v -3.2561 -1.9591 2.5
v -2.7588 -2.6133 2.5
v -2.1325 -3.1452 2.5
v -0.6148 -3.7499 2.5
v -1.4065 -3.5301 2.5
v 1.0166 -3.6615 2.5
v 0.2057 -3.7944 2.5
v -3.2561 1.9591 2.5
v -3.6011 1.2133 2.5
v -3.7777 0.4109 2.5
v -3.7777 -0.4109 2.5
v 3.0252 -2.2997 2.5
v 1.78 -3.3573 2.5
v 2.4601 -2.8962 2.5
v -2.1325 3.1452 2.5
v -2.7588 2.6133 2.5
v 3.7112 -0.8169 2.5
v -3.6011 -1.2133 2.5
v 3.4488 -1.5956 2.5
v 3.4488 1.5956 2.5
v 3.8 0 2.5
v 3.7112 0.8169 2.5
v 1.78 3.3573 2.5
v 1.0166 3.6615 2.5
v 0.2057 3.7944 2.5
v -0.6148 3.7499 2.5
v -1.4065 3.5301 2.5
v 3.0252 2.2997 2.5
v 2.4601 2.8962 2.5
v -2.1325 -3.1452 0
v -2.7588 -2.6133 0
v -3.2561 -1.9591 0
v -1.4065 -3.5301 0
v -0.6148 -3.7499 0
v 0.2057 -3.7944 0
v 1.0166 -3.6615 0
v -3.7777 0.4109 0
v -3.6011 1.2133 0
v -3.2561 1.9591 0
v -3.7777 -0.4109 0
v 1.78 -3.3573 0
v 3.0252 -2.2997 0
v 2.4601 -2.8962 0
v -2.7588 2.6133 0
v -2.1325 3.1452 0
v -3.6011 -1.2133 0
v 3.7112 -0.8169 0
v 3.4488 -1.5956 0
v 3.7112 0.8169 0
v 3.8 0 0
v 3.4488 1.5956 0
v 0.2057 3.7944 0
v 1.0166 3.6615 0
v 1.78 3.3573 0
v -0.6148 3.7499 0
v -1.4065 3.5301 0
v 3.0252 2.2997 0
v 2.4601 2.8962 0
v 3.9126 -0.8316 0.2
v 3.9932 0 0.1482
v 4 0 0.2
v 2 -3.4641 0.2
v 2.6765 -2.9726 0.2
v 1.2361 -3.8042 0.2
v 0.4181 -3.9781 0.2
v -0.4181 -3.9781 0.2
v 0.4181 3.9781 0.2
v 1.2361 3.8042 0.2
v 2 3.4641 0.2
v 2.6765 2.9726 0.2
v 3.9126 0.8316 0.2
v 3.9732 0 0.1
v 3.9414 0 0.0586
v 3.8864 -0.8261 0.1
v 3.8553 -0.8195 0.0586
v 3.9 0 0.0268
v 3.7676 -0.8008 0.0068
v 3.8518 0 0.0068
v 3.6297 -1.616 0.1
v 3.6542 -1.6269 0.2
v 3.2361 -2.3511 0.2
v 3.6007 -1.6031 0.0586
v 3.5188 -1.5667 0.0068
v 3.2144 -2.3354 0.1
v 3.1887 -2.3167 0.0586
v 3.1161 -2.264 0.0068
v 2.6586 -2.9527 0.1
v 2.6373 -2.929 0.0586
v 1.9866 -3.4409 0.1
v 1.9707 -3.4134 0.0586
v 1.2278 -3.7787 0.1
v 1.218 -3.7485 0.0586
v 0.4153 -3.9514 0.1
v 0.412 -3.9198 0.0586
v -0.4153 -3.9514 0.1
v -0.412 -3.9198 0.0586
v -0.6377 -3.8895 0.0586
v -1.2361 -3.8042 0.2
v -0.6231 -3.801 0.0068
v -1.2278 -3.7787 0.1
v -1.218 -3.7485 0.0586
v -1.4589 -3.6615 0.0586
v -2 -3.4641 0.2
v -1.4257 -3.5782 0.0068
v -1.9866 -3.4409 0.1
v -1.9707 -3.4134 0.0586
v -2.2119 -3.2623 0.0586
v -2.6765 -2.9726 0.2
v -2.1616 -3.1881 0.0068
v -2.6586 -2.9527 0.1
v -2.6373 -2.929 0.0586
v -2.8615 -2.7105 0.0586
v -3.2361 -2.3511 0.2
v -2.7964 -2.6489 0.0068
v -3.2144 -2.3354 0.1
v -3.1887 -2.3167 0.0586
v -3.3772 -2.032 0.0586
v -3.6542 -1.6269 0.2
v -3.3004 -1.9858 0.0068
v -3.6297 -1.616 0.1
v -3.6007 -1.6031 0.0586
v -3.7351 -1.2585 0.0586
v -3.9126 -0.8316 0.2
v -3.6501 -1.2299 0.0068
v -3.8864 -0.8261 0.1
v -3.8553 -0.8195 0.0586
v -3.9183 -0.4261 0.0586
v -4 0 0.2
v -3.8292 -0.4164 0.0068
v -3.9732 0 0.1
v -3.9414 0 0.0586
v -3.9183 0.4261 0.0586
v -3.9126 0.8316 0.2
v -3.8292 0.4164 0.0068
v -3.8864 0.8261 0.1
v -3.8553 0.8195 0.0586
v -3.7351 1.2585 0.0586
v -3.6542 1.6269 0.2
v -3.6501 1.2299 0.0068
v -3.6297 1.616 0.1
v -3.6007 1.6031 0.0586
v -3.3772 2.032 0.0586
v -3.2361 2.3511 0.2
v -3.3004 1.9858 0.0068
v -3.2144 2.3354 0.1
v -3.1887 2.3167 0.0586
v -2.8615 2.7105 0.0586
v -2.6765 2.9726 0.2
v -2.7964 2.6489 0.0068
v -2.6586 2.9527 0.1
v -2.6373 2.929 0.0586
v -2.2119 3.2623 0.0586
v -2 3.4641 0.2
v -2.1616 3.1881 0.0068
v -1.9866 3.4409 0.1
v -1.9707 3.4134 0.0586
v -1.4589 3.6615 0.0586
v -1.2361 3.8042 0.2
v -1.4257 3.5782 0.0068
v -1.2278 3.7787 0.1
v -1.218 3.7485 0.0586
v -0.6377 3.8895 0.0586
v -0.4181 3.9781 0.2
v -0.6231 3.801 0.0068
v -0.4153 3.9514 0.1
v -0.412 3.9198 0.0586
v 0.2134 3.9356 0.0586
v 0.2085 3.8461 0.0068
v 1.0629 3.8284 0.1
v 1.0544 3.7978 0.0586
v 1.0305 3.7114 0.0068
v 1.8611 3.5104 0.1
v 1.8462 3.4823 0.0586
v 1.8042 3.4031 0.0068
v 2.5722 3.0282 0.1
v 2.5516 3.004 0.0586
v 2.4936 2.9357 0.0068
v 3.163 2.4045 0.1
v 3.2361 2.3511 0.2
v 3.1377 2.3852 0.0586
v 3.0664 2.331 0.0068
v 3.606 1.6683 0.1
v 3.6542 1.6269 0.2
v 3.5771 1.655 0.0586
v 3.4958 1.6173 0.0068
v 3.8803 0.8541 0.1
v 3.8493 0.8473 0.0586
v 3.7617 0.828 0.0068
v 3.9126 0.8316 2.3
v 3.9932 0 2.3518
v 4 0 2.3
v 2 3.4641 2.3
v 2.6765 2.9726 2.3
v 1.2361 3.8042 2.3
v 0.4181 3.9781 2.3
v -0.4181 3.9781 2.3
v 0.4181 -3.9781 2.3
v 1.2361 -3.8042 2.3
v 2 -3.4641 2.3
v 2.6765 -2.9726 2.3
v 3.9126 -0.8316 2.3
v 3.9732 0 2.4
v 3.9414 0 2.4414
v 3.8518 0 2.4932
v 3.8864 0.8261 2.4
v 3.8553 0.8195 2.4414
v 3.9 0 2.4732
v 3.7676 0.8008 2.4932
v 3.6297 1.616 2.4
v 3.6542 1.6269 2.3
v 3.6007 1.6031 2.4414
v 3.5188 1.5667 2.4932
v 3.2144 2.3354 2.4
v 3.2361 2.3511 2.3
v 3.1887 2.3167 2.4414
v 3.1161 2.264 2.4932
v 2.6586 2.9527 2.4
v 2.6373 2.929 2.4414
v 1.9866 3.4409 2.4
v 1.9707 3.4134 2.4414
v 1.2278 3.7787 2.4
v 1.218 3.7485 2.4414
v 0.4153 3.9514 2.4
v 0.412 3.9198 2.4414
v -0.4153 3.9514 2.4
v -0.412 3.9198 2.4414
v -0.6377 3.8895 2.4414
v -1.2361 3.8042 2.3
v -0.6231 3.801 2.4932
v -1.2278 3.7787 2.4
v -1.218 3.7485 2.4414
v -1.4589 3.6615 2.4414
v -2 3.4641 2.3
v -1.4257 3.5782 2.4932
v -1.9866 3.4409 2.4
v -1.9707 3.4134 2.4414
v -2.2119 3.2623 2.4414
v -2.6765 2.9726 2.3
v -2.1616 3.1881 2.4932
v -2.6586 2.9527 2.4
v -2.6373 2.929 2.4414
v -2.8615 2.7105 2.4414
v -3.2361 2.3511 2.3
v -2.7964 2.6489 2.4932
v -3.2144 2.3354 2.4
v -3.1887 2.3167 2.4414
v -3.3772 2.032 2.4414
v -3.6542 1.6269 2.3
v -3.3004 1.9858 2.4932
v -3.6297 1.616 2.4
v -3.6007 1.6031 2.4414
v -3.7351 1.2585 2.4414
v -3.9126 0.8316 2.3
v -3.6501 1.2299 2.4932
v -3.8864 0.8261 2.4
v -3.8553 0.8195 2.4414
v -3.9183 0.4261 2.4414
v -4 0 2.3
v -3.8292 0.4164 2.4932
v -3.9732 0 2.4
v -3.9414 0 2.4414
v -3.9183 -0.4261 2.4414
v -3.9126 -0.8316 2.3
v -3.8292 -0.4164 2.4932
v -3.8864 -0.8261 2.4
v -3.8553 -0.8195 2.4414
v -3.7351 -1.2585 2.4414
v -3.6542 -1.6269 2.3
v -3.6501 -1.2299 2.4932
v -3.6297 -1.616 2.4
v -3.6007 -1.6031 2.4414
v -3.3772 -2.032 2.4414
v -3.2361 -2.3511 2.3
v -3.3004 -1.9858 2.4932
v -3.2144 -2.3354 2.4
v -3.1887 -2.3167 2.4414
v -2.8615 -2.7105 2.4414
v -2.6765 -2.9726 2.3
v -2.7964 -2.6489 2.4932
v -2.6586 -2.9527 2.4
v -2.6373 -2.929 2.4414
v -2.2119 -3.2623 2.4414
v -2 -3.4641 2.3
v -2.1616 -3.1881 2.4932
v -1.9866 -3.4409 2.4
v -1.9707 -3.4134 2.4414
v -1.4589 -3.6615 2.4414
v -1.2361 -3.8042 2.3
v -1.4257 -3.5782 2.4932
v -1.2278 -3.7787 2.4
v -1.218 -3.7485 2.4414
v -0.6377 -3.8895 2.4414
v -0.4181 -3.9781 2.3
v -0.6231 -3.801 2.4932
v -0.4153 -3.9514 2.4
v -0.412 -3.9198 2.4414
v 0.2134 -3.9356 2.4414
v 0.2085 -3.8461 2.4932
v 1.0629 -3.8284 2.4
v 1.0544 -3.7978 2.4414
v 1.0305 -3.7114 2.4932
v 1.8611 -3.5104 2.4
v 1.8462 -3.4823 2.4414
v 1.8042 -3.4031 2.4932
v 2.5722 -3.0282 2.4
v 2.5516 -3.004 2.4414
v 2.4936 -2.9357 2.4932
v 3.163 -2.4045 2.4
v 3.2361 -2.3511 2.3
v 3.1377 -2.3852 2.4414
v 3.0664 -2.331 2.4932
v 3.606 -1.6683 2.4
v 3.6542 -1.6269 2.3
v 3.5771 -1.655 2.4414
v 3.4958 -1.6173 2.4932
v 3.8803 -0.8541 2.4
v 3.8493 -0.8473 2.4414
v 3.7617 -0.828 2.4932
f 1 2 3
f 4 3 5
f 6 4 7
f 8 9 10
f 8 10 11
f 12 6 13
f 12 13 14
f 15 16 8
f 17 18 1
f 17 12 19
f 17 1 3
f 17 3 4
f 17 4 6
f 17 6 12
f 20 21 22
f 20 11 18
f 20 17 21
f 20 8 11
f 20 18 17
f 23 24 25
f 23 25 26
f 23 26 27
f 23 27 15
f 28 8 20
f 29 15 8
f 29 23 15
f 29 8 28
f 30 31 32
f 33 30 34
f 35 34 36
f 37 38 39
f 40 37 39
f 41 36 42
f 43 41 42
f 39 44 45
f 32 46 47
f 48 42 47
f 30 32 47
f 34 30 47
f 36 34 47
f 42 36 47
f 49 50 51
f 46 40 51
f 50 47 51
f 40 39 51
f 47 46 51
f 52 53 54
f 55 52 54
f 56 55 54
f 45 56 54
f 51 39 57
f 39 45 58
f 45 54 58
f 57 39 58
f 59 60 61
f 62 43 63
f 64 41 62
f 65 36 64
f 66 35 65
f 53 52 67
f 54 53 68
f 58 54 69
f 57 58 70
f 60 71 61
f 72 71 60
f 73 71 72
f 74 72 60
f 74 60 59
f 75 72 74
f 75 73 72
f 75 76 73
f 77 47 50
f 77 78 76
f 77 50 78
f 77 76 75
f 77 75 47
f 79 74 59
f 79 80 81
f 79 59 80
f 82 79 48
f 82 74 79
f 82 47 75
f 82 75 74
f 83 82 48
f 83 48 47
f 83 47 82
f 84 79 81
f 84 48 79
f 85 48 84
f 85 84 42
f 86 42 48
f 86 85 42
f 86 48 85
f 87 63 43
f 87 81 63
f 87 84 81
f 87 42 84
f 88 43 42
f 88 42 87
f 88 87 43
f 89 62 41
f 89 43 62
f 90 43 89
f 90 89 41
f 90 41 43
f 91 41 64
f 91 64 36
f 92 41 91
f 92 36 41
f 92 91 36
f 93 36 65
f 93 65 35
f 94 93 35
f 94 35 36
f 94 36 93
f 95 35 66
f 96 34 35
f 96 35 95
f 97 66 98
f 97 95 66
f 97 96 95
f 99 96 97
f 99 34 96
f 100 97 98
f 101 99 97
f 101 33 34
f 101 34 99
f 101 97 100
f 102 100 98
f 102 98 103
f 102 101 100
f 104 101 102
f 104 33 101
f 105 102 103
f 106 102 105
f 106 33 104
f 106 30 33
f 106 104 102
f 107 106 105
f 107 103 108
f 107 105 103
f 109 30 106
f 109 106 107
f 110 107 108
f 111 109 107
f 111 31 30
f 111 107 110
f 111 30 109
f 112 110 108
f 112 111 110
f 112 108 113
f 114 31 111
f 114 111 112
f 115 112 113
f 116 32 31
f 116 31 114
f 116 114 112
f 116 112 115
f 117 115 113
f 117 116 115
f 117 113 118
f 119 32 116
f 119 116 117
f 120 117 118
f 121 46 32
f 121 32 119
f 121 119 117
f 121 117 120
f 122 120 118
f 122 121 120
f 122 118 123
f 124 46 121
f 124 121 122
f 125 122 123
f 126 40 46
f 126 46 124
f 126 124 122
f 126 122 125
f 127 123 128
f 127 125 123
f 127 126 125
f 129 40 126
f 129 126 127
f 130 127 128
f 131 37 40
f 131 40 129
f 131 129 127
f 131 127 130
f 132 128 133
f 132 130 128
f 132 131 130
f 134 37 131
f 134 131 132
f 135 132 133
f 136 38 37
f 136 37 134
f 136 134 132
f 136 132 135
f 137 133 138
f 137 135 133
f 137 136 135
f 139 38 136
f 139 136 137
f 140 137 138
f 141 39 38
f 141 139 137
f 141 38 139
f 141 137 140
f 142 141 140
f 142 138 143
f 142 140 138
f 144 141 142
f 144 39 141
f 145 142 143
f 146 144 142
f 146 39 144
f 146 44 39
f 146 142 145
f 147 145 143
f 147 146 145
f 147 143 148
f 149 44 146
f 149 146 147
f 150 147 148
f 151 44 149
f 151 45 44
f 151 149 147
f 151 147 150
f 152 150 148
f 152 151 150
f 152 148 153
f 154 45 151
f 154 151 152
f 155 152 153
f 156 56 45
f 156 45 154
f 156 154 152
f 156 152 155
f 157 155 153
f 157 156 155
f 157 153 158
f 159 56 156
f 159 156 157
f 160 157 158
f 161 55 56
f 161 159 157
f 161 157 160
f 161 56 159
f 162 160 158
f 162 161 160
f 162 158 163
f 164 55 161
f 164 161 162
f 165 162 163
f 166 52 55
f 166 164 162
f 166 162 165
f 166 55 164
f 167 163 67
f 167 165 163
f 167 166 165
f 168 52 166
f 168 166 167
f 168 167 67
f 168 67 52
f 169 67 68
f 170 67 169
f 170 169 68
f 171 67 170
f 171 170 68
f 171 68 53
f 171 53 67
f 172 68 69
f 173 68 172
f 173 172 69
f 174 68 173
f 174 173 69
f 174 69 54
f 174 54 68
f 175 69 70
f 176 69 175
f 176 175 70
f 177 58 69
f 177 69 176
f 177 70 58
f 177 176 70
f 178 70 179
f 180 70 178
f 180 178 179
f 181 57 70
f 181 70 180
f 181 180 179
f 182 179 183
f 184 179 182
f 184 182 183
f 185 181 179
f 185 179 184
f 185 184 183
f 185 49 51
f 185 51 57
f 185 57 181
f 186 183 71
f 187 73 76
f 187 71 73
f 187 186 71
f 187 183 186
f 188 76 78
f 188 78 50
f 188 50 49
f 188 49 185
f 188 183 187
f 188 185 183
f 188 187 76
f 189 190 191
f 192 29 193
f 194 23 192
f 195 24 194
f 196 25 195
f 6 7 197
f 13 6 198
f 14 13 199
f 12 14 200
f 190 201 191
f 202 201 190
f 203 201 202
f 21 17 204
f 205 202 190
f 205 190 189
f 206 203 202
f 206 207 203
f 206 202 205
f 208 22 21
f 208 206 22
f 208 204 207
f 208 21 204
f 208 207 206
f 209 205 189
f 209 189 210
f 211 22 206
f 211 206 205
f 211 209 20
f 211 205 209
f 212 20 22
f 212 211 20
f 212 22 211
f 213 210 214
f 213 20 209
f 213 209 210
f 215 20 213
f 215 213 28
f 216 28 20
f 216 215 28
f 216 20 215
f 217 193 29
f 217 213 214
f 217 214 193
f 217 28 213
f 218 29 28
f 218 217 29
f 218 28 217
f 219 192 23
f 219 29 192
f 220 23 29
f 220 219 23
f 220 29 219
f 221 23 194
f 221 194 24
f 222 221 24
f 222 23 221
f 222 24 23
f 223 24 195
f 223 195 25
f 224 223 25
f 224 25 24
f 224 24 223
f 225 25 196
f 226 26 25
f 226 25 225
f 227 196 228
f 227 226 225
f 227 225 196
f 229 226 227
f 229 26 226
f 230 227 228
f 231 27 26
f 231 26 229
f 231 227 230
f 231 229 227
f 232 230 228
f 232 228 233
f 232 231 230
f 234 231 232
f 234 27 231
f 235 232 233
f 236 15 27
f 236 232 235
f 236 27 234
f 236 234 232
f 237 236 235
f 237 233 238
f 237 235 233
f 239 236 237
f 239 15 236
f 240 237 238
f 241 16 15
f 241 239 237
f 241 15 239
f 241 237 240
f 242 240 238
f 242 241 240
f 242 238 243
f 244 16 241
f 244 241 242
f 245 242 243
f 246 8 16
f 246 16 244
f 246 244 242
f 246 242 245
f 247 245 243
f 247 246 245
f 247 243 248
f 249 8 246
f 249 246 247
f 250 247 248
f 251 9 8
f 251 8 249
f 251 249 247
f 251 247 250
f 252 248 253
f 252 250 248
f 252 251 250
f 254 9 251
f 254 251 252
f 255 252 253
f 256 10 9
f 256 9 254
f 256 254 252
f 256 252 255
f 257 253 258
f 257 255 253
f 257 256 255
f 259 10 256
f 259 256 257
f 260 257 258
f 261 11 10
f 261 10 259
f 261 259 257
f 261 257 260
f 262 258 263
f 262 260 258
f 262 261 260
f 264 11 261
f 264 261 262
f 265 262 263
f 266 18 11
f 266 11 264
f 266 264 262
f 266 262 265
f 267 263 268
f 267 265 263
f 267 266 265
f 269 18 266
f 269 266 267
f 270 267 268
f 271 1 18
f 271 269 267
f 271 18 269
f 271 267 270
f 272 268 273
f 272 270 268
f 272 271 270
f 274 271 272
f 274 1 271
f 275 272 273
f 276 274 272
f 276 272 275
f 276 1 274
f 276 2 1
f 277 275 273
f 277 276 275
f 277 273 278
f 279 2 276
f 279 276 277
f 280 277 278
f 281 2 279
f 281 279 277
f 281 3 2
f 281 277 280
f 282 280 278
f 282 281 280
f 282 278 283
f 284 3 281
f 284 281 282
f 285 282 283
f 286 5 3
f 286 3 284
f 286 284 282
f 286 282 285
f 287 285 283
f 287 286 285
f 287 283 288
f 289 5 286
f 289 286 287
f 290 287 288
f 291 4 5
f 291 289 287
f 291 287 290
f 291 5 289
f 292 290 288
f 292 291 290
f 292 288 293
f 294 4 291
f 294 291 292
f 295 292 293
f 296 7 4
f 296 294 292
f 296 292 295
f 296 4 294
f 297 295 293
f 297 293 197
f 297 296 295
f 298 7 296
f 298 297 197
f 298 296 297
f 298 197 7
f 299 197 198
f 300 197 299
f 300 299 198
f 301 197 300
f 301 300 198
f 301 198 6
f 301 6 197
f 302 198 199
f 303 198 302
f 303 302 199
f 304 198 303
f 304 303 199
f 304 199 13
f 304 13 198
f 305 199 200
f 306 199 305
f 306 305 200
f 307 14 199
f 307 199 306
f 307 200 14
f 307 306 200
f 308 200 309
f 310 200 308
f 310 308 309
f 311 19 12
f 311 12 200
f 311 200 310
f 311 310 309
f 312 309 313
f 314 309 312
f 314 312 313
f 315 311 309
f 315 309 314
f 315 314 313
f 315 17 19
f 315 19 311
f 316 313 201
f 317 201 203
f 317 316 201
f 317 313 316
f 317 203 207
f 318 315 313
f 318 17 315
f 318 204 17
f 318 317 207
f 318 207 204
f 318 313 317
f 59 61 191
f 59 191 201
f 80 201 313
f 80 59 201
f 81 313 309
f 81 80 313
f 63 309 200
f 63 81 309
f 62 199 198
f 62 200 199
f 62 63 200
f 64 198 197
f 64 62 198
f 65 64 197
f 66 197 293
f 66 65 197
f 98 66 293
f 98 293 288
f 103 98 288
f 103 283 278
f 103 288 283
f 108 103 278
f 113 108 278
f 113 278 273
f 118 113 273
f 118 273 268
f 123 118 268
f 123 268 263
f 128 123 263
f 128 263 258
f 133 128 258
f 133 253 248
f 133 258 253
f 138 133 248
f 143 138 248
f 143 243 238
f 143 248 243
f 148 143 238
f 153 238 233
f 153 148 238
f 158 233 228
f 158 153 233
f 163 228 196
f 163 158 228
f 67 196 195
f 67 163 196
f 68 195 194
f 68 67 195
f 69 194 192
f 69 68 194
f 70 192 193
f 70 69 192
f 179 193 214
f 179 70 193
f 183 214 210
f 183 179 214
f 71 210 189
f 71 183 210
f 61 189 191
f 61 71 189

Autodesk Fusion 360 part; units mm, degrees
sketch "Sketch1" plane through (0, 0, 0) normal (0, 0, 1) x (1, 0, 0)
  circle A0 centre (0, 0) radius 4
  dimension "d1" = 8
extrude "Extrude1" add sketch "Sketch1" along normal blind 2.5
fillet "Fillet1" radius 0.2 1 edges at (-3.7293, -1.4465, 2.5)
fillet "Fillet2" radius 0.2 1 edges at (-3.7293, -1.4465, 0)
